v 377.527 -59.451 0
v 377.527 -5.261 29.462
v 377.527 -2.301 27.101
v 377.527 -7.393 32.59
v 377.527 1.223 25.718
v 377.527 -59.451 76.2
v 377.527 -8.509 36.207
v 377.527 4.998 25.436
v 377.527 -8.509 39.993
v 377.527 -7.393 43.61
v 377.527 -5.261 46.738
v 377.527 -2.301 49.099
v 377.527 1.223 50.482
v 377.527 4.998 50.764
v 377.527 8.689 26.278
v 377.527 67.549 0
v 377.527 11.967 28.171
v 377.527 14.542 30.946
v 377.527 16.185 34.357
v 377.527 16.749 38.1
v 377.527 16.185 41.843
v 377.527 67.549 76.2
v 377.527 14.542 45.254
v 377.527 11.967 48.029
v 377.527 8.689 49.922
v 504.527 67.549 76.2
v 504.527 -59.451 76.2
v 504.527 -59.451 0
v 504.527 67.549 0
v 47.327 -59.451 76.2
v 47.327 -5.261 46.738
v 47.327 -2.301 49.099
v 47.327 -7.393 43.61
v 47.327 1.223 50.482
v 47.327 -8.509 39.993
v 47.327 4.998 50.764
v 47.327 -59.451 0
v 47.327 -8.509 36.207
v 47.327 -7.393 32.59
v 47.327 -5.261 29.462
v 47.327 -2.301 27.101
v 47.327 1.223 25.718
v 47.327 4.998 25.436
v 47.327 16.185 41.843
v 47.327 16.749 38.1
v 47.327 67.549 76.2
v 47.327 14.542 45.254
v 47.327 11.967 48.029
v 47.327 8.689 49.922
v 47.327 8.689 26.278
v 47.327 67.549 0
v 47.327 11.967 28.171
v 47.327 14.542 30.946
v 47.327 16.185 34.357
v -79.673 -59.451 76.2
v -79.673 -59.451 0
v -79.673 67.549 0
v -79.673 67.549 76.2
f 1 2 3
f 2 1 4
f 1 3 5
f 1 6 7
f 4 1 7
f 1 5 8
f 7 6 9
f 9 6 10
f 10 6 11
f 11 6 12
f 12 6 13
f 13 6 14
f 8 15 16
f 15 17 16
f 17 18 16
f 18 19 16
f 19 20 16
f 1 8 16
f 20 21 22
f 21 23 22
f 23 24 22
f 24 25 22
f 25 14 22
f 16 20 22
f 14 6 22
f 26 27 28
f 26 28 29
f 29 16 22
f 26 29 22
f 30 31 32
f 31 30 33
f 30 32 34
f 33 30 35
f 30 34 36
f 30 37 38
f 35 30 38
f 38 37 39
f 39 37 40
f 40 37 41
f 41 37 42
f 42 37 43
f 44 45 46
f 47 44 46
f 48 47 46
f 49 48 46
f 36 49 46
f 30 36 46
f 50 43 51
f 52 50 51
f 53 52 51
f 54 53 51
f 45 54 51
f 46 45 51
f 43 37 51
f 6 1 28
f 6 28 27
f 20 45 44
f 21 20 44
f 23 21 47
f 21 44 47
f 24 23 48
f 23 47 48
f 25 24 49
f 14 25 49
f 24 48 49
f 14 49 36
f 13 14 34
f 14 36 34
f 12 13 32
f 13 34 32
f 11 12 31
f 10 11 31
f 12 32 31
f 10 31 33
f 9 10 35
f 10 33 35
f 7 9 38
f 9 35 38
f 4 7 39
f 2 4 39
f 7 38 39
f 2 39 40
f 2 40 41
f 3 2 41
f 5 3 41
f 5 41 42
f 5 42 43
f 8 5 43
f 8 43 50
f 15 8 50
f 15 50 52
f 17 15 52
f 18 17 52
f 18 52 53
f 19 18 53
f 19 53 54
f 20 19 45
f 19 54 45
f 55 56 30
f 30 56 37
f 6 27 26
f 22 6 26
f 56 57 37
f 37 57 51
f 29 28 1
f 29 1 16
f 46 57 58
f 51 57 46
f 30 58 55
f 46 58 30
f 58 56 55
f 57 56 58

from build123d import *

# Parameters (mm, degrees)
F0_W     = 127
F0_H     = 127
F1_DEPTH = 76.2
F3_DEPTH = 330.2
F4_W     = 127
F4_H     = 76.2
F4_R     = 12.7
F5_DEPTH = 127


with BuildPart() as f1:
    # F0 (on Top) → F1 (new body)
    with BuildSketch(Plane.XY):
        with Locations((-16.172883, 4.04909)):
            Rectangle(F0_W, F0_H)
    extrude(amount=F1_DEPTH)

    # F2 (on face) → F3 (join)
    with BuildSketch(Plane.YZ.offset(47.327117)):
        with BuildLine():
            ThreePointArc((-8.65091, 38.1), (4.04909, 25.4), (16.74909, 38.1))
            ThreePointArc((16.74909, 38.1), (4.04909, 50.8), (-8.65091, 38.1))
        make_face()
    extrude(amount=F3_DEPTH)

    # F4 (on face) → F5 (join)
    with BuildSketch(Plane.YZ.offset(377.527117)):
        with Locations((4.04909, 38.1)):
            Rectangle(F4_W, F4_H)
        with Locations((4.04909, 38.1)):
            Circle(F4_R, mode=Mode.SUBTRACT)
        with Locations((4.04909, 38.1)):
            Circle(F4_R)
    extrude(amount=F5_DEPTH)


solid = f1.part
